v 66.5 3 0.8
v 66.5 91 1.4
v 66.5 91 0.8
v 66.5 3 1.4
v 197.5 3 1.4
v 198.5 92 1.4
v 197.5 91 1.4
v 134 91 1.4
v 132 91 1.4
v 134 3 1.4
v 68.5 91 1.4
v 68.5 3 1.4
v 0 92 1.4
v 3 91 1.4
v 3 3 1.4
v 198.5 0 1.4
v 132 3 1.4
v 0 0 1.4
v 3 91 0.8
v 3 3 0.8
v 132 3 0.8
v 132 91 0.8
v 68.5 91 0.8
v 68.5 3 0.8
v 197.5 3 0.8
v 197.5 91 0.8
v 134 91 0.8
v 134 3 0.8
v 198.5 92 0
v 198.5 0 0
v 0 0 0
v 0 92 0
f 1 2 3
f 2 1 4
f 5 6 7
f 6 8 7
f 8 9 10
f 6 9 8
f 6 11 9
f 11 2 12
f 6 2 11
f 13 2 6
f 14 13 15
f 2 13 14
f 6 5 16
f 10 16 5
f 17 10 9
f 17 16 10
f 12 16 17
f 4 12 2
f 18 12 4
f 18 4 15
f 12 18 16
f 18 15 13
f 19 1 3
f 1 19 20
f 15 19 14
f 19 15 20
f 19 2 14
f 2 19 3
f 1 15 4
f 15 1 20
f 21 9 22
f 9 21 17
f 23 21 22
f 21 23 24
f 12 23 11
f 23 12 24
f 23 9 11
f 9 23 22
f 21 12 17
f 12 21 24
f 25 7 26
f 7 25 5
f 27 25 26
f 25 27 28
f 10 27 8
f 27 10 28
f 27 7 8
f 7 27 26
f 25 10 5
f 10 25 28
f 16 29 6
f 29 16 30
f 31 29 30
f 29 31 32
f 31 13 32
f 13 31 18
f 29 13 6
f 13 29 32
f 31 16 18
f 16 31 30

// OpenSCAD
// Material and card dimensions
sheet_thickness = 2.05;
card_size = [63.5, 88.0, 0.6];
number_of_cards = 3;

// Border spacing
inner_border = 2;
outer_border = 2;  // Increased from 1 to 2

// Calculate tray dimensions
tray_size = [
    card_size[0] * number_of_cards + inner_border * (number_of_cards + 1) + outer_border,
    card_size[1] + inner_border * 2 + outer_border,
    inner_border
];

// Calculate inner cavity dimensions
cavity_size = [
    tray_size[0] - outer_border,
    tray_size[1] - outer_border,
    tray_size[2] - card_size[2]
];

// Build tray
difference() {
    cube(cavity_size);
    
    // Card slots
    for (i = [1 : number_of_cards]) {
        translate([
            outer_border / 2 + inner_border * i + card_size[0] * (i - 1),
            outer_border / 2 + inner_border,
            cavity_size[2] - card_size[2]
        ])
        cube(card_size);
    }
}
